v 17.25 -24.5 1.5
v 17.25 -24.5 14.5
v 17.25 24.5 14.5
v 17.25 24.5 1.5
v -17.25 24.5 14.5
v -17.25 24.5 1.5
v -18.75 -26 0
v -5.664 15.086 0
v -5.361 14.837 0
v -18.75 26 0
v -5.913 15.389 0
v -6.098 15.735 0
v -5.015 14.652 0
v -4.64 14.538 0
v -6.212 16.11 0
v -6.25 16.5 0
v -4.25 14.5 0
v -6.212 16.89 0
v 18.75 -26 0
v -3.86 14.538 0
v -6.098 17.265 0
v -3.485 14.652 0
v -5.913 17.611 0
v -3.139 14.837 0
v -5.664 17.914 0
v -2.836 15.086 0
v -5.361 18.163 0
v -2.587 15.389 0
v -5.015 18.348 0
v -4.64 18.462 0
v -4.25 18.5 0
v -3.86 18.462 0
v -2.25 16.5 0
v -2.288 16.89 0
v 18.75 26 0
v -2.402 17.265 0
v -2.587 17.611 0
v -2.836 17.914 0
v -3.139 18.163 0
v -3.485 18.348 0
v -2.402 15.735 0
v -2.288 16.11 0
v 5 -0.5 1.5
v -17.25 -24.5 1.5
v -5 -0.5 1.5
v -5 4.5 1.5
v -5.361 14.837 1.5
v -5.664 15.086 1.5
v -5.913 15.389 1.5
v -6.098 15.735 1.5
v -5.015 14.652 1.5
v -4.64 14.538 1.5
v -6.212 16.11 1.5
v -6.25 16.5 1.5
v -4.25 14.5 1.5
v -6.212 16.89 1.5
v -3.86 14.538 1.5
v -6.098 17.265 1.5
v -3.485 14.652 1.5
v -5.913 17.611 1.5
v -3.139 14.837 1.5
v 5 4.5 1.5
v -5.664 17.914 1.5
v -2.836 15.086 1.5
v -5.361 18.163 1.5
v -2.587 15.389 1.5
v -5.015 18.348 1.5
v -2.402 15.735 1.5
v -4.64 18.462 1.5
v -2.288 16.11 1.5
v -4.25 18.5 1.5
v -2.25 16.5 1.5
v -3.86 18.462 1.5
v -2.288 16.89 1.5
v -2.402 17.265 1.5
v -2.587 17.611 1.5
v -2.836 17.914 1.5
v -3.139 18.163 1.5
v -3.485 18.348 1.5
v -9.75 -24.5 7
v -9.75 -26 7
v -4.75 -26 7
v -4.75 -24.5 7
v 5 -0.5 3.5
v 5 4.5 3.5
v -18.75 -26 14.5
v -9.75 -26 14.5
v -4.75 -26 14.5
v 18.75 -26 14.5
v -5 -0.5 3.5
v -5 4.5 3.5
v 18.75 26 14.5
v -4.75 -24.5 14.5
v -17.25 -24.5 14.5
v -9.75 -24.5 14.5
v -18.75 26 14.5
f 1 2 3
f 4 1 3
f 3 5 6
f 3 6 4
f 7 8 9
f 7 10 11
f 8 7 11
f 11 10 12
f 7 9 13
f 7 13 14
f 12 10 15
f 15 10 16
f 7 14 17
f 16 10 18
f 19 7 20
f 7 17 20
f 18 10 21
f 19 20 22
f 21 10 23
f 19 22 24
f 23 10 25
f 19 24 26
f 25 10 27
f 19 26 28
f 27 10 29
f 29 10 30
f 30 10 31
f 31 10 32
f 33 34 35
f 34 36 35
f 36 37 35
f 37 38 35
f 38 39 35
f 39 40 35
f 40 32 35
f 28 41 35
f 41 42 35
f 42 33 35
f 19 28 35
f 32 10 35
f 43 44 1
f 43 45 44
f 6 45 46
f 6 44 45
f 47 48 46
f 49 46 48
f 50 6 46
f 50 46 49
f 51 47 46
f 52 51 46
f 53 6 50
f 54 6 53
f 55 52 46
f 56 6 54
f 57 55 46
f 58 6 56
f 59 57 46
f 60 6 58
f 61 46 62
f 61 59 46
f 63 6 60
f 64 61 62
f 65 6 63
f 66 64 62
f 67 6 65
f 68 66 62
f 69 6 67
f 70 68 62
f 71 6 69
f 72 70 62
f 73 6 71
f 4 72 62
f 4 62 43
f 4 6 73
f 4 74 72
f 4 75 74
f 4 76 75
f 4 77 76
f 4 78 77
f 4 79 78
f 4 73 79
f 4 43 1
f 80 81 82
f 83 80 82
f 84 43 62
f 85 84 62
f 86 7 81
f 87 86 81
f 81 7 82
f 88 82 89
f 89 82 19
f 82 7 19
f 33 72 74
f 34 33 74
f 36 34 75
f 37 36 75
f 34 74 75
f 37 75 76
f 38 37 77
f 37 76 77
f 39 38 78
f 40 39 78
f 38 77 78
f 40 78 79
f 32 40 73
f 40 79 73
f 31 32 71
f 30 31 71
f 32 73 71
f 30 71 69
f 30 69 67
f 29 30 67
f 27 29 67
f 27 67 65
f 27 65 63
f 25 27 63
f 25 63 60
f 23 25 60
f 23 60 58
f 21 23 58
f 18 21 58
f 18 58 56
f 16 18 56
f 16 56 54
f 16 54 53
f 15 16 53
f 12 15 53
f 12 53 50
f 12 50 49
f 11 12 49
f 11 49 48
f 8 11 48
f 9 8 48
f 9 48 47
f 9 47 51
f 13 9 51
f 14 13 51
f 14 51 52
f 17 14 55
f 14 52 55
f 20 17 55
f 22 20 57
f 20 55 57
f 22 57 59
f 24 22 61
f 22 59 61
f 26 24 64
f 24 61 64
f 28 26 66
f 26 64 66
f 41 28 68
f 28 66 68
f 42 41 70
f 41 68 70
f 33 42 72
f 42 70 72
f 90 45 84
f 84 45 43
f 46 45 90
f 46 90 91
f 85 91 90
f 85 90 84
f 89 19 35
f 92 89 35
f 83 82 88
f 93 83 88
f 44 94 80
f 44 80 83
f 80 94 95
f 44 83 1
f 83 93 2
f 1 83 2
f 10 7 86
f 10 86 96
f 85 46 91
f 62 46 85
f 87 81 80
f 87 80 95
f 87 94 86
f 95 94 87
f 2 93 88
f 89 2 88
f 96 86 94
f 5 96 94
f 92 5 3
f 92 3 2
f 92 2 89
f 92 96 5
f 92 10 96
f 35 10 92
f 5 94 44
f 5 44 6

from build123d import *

# Parameters (mm, degrees)
F0_W     = 37.5
F0_H     = 52
F1_DEPTH = 14.5
F2_W     = 34.5
F2_H     = 49
F3_DEPTH = 13
F4_R     = 2
F5_DEPTH = 25
F6_W     = 10
F6_H     = 5
F7_DEPTH = 2
F8_W     = 5
F8_H     = 7.5
F9_DEPTH = 10


with BuildPart() as f1:
    # F0 (on Top) → F1 (new body)
    with BuildSketch(Plane.XY):
        Rectangle(F0_W, F0_H)
    extrude(amount=F1_DEPTH)

    # F2 (on face) → F3 (cut)
    with BuildSketch(Plane.XY.offset(14.5)):
        Rectangle(F2_W, F2_H)
    extrude(amount=-F3_DEPTH, mode=Mode.SUBTRACT)

    # F4 (on face) → F5 (cut)
    with BuildSketch(Plane.XY.offset(1.5)):
        with Locations((-4.25, 16.5)):
            Circle(F4_R)
    extrude(amount=-F5_DEPTH, mode=Mode.SUBTRACT)

    # F6 (on face) → F7 (join)
    with BuildSketch(Plane.XY.offset(1.5)):
        with Locations((0, 2)):
            Rectangle(F6_W, F6_H)
    extrude(amount=F7_DEPTH)

    # F8 (on face) → F9 (cut)
    with BuildSketch(Plane.XZ.offset(26)):
        with Locations((-7.25, 10.75)):
            Rectangle(F8_W, F8_H)
    extrude(amount=-F9_DEPTH, mode=Mode.SUBTRACT)


solid = f1.part
